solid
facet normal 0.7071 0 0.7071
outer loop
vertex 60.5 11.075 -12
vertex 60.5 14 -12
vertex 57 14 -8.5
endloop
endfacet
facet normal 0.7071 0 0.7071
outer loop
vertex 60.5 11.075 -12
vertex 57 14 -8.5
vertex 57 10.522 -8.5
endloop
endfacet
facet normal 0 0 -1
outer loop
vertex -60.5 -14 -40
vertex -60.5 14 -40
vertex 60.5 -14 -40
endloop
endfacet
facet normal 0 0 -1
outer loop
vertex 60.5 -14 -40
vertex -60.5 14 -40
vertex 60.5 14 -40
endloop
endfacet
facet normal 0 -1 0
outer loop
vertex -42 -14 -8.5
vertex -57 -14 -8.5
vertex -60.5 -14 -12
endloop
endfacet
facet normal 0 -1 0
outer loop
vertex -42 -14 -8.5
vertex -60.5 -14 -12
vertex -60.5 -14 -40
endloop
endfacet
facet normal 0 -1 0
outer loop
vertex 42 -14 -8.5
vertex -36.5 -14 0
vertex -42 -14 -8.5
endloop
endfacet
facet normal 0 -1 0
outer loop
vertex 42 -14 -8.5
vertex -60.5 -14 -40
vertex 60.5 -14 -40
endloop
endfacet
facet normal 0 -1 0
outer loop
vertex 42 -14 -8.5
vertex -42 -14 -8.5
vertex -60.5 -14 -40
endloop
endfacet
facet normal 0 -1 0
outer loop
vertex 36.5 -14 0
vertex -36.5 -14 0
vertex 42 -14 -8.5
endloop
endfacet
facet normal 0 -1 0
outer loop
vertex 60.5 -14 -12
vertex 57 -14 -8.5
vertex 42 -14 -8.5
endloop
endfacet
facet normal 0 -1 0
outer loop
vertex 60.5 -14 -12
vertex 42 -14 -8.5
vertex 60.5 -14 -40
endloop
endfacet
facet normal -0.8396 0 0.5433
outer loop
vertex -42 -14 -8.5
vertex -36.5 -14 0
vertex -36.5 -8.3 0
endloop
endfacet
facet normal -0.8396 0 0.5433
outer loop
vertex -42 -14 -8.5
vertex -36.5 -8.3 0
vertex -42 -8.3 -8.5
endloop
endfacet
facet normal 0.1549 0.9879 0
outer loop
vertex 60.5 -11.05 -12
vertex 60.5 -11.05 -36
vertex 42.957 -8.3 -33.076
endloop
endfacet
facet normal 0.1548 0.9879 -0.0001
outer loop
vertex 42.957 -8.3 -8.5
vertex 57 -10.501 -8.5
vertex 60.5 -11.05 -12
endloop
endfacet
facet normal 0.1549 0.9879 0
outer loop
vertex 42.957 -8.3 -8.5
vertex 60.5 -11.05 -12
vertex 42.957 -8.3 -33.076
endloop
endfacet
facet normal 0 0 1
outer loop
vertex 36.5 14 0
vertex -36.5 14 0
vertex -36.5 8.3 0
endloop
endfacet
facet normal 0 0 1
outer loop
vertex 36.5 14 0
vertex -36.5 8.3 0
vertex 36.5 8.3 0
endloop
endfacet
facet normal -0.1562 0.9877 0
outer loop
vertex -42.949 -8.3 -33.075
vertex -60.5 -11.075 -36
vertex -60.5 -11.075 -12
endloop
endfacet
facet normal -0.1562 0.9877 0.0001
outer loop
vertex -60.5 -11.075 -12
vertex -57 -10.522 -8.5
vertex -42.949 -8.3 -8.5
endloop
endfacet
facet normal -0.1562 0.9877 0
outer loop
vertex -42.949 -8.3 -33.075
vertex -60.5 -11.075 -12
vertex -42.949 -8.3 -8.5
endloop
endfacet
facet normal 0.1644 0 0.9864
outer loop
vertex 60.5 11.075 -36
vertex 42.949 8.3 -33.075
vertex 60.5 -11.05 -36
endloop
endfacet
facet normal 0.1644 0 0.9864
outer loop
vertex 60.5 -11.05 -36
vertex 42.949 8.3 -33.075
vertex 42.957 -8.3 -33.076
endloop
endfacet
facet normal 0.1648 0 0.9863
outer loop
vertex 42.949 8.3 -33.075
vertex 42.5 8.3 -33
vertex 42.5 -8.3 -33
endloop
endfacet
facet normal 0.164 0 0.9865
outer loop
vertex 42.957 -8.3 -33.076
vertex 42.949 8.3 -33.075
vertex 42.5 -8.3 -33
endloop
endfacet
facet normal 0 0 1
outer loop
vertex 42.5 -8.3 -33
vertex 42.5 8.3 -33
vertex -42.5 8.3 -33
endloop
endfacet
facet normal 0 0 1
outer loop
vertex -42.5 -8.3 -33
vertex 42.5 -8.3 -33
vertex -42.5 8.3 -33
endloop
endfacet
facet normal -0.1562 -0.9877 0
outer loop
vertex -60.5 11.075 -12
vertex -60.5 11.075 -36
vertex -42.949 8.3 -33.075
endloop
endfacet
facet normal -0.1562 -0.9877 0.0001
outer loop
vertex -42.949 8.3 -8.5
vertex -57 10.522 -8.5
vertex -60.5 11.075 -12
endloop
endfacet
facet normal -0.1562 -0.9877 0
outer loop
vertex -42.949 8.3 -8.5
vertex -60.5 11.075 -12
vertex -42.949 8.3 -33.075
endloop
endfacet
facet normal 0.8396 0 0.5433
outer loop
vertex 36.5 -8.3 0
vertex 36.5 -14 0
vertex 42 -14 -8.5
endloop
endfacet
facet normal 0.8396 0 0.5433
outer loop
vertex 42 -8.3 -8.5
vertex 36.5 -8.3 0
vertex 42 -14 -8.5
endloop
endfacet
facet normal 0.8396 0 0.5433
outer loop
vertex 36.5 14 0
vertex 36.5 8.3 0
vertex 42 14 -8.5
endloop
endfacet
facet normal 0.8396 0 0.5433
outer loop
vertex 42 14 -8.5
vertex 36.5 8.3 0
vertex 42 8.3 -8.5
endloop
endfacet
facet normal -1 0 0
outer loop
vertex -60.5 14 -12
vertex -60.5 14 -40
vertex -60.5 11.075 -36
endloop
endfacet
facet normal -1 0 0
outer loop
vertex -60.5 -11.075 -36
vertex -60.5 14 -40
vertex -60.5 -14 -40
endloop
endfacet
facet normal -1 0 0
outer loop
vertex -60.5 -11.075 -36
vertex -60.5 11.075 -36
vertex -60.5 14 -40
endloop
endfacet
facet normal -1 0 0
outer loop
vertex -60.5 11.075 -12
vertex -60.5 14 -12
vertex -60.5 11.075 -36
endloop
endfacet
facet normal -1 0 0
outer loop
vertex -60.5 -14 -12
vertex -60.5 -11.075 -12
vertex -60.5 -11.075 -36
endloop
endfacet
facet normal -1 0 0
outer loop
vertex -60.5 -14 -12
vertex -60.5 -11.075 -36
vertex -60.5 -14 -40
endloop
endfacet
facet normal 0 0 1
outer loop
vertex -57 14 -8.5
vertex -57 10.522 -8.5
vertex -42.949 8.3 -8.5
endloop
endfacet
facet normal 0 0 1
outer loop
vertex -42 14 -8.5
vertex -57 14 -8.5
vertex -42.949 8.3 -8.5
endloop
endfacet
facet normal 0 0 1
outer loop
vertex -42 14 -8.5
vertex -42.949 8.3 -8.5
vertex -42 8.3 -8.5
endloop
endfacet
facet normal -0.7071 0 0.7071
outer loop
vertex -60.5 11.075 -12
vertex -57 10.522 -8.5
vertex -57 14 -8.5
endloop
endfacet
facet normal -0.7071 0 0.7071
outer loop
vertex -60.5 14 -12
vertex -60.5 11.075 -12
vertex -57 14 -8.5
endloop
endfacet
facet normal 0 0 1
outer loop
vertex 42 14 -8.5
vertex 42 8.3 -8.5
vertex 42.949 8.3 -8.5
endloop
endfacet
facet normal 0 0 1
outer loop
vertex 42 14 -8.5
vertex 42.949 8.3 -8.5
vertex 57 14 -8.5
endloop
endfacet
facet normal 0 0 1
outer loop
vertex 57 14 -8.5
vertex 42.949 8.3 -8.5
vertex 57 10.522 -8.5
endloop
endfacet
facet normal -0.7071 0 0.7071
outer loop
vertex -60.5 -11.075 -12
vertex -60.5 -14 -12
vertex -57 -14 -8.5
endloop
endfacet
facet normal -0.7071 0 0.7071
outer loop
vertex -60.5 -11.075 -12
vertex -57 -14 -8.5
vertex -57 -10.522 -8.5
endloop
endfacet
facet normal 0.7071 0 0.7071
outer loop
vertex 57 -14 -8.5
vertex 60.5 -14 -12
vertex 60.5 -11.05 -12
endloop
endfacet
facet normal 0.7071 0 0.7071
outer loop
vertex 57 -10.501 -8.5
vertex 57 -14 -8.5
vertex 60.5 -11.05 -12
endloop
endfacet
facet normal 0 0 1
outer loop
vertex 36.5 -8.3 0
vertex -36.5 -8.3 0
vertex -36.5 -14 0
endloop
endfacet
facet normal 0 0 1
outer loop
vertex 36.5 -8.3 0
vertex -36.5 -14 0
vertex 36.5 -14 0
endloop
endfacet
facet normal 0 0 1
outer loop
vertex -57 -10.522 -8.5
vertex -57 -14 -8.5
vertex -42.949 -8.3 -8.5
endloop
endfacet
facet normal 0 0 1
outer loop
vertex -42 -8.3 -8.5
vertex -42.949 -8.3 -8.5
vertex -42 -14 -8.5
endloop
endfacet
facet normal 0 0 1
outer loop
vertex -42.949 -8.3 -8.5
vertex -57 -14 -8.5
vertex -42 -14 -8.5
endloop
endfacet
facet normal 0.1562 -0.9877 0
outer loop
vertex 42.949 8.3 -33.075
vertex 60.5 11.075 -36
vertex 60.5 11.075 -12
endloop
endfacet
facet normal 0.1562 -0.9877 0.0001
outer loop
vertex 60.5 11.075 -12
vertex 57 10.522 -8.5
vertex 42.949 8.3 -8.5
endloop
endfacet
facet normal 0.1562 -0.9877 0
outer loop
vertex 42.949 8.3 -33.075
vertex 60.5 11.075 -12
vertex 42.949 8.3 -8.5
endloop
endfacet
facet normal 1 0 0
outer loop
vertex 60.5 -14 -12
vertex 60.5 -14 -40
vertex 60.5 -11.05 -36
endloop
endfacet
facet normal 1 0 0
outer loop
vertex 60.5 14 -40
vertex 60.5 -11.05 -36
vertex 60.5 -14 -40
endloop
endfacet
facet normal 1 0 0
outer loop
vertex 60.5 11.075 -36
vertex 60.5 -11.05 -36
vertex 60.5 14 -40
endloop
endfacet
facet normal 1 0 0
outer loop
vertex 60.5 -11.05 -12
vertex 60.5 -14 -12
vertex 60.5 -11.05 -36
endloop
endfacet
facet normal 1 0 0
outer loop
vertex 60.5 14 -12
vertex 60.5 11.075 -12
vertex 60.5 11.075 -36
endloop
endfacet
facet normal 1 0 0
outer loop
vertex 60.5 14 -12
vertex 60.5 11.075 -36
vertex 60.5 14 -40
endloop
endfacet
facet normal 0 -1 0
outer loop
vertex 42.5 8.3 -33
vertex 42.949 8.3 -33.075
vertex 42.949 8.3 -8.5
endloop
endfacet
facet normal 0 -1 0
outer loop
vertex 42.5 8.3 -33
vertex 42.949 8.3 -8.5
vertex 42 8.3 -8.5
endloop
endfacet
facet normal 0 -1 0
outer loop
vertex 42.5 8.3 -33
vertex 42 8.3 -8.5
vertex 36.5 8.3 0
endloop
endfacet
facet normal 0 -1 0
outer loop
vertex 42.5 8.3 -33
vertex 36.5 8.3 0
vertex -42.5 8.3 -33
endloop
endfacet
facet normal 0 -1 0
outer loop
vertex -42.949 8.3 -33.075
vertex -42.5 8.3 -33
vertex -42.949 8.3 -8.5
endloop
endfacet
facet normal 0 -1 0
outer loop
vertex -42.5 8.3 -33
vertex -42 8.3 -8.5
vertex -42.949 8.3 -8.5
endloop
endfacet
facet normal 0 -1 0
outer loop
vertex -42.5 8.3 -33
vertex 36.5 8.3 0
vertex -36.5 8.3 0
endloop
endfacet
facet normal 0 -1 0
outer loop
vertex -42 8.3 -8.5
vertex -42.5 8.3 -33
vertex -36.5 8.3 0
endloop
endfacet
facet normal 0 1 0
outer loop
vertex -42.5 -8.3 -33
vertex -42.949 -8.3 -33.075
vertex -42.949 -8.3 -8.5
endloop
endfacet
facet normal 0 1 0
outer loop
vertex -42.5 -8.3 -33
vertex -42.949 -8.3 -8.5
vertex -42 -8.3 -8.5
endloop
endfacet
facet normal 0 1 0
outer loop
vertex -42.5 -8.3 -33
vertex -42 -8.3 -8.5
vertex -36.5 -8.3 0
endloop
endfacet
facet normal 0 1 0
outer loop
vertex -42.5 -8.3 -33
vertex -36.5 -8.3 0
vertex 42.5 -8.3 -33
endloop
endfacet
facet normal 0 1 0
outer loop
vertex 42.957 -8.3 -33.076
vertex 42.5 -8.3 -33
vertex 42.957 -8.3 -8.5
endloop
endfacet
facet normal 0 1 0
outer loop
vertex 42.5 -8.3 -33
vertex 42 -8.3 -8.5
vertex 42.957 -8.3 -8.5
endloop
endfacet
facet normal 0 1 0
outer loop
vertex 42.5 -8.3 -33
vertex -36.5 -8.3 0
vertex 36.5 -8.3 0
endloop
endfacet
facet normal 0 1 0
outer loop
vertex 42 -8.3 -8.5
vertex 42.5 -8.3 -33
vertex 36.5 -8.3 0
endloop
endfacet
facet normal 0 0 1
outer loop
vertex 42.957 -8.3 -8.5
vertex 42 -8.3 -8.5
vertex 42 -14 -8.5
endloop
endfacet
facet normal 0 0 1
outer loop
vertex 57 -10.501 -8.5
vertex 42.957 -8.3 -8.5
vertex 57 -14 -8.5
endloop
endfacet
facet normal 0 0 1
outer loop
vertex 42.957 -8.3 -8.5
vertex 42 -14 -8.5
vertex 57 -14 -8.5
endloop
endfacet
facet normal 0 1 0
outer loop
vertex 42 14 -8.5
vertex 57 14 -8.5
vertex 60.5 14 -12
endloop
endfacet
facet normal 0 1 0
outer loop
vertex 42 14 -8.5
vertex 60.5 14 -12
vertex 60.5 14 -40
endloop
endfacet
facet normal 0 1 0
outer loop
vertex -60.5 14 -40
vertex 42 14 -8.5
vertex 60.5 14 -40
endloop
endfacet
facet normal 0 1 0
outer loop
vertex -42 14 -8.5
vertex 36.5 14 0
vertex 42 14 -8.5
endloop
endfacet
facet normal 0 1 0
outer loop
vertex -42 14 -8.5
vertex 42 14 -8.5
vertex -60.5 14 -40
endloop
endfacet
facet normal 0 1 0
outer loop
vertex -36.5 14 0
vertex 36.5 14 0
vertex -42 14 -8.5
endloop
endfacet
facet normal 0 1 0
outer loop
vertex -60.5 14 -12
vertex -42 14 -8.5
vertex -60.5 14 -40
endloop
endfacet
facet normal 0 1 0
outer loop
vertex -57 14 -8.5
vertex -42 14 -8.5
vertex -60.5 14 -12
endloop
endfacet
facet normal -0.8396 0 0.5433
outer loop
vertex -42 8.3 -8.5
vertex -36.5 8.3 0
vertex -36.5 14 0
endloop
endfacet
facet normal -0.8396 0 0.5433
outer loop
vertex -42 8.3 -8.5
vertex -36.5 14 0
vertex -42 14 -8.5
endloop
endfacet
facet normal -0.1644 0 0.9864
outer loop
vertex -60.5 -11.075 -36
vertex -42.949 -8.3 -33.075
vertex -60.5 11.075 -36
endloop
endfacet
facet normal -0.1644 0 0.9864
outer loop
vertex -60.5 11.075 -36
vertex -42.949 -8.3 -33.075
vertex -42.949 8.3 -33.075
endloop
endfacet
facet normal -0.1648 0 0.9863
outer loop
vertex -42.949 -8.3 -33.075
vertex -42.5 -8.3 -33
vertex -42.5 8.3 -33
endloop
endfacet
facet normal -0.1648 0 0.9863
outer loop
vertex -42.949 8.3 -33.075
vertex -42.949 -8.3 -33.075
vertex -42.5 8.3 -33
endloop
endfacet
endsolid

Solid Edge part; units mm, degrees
sketch "Sketch1" plane through (0, 0, 0) normal (0, 0, 1) x (1, 0, 0)
  line L0 (-60.5, -14) -> (60.5, -14)
  line L1 (60.5, -14) -> (60.5, 14)
  line L2 (60.5, 14) -> (-60.5, 14)
  line L3 (-60.5, 14) -> (-60.5, -14)
extrude "Protrusion1" add sketch "Sketch1" against normal blind 40
sketch "Sketch2" plane through (0, -14, -20) normal (0, -1, 0) x (1, 0, 0)
  line L0 (60.5, 20) -> (42, 20)
  line L1 (42, 20) -> (42, 11.5)
  line L2 (42, 11.5) -> (60.5, 11.5)
  line L3 (60.5, 11.5) -> (60.5, 20)
  line L4 (-60.5, 11.5) -> (-42, 11.5)
  line L5 (-42, 11.5) -> (-42, 20)
  line L6 (-42, 20) -> (-60.5, 20)
  line L7 (-60.5, 20) -> (-60.5, 11.5)
extrude "ExtrudedCutout_1" cut sketch "Sketch2" against normal blind 28
extrude "Cutout1" [suppressed]
sketch "Sketch3" plane through (0, 11.075, 0) normal (0, 0, 1) x (1, 0, 0)
  line L0 (60.5, -2.925) -> (60.5, 0)
  line L1 (60.5, 0) -> (42, -2.925)
  line L2 (42, -2.925) -> (60.5, -2.925)
  line L3 (60.5, -19.225) -> (60.5, -22.125)
  line L4 (60.5, -22.125) -> (42, -19.225)
  line L5 (42, -19.225) -> (60.5, -19.225)
  line L6 (-60.5, -2.925) -> (-60.5, 0)
  line L7 (-60.5, 0) -> (-42, -2.925)
  line L8 (-42, -2.925) -> (-60.5, -2.925)
  line L9 (-60.5, -19.225) -> (-60.5, -22.15)
  line L10 (-60.5, -22.15) -> (-42, -19.225)
  line L11 (-42, -19.225) -> (-60.5, -19.225)
extrude "ExtrudedCutout_4" cut sketch "Sketch3" against normal blind 33
sketch "Sketch4" plane through (0, 0, 0) normal (0, 0, 1) x (1, 0, 0)
  line L0 (-60.5, -8.3) -> (60.5, -8.3)
  line L1 (60.5, -8.3) -> (60.5, 8.3)
  line L2 (60.5, 8.3) -> (-60.5, 8.3)
  line L3 (-60.5, 8.3) -> (-60.5, -8.3)
extrude "ExtrudedCutout_5" cut sketch "Sketch4" against normal blind 33
chamfer "Chamfer_2" distance 3 distance2 18 1 edges at (-60.5, 0, -33) measured on face at (-60.5, 9.6133, -34.435)
chamfer "Chamfer_3" distance 3 distance2 18 1 edges at (60.5, 0.0125, -33) measured on face at (60.5, -9.6133, -34.435)
sketch "Sketch5" plane through (0, -14, -20) normal (0, -1, 0) x (1, 0, 0)
  line L0 (-36.5, 20) -> (-42, 11.5)
  line L1 (-42, 11.5) -> (-42, 20)
  line L2 (-42, 20) -> (-36.5, 20)
  line L3 (36.5, 20) -> (42, 11.5)
  line L4 (42, 11.5) -> (42, 20)
  line L5 (42, 20) -> (36.5, 20)
extrude "ExtrudedCutout_6" cut sketch "Sketch5" against normal blind 40
chamfer "Chamfer_4" distance 3.5 angle 45 1 edges at (60.5, -12.525, -8.5)
chamfer "Chamfer_5" distance 3.5 angle 45 3 edges at (-60.5, -12.5375, -8.5) (-60.5, 12.5375, -8.5) (60.5, 12.5375, -8.5)
